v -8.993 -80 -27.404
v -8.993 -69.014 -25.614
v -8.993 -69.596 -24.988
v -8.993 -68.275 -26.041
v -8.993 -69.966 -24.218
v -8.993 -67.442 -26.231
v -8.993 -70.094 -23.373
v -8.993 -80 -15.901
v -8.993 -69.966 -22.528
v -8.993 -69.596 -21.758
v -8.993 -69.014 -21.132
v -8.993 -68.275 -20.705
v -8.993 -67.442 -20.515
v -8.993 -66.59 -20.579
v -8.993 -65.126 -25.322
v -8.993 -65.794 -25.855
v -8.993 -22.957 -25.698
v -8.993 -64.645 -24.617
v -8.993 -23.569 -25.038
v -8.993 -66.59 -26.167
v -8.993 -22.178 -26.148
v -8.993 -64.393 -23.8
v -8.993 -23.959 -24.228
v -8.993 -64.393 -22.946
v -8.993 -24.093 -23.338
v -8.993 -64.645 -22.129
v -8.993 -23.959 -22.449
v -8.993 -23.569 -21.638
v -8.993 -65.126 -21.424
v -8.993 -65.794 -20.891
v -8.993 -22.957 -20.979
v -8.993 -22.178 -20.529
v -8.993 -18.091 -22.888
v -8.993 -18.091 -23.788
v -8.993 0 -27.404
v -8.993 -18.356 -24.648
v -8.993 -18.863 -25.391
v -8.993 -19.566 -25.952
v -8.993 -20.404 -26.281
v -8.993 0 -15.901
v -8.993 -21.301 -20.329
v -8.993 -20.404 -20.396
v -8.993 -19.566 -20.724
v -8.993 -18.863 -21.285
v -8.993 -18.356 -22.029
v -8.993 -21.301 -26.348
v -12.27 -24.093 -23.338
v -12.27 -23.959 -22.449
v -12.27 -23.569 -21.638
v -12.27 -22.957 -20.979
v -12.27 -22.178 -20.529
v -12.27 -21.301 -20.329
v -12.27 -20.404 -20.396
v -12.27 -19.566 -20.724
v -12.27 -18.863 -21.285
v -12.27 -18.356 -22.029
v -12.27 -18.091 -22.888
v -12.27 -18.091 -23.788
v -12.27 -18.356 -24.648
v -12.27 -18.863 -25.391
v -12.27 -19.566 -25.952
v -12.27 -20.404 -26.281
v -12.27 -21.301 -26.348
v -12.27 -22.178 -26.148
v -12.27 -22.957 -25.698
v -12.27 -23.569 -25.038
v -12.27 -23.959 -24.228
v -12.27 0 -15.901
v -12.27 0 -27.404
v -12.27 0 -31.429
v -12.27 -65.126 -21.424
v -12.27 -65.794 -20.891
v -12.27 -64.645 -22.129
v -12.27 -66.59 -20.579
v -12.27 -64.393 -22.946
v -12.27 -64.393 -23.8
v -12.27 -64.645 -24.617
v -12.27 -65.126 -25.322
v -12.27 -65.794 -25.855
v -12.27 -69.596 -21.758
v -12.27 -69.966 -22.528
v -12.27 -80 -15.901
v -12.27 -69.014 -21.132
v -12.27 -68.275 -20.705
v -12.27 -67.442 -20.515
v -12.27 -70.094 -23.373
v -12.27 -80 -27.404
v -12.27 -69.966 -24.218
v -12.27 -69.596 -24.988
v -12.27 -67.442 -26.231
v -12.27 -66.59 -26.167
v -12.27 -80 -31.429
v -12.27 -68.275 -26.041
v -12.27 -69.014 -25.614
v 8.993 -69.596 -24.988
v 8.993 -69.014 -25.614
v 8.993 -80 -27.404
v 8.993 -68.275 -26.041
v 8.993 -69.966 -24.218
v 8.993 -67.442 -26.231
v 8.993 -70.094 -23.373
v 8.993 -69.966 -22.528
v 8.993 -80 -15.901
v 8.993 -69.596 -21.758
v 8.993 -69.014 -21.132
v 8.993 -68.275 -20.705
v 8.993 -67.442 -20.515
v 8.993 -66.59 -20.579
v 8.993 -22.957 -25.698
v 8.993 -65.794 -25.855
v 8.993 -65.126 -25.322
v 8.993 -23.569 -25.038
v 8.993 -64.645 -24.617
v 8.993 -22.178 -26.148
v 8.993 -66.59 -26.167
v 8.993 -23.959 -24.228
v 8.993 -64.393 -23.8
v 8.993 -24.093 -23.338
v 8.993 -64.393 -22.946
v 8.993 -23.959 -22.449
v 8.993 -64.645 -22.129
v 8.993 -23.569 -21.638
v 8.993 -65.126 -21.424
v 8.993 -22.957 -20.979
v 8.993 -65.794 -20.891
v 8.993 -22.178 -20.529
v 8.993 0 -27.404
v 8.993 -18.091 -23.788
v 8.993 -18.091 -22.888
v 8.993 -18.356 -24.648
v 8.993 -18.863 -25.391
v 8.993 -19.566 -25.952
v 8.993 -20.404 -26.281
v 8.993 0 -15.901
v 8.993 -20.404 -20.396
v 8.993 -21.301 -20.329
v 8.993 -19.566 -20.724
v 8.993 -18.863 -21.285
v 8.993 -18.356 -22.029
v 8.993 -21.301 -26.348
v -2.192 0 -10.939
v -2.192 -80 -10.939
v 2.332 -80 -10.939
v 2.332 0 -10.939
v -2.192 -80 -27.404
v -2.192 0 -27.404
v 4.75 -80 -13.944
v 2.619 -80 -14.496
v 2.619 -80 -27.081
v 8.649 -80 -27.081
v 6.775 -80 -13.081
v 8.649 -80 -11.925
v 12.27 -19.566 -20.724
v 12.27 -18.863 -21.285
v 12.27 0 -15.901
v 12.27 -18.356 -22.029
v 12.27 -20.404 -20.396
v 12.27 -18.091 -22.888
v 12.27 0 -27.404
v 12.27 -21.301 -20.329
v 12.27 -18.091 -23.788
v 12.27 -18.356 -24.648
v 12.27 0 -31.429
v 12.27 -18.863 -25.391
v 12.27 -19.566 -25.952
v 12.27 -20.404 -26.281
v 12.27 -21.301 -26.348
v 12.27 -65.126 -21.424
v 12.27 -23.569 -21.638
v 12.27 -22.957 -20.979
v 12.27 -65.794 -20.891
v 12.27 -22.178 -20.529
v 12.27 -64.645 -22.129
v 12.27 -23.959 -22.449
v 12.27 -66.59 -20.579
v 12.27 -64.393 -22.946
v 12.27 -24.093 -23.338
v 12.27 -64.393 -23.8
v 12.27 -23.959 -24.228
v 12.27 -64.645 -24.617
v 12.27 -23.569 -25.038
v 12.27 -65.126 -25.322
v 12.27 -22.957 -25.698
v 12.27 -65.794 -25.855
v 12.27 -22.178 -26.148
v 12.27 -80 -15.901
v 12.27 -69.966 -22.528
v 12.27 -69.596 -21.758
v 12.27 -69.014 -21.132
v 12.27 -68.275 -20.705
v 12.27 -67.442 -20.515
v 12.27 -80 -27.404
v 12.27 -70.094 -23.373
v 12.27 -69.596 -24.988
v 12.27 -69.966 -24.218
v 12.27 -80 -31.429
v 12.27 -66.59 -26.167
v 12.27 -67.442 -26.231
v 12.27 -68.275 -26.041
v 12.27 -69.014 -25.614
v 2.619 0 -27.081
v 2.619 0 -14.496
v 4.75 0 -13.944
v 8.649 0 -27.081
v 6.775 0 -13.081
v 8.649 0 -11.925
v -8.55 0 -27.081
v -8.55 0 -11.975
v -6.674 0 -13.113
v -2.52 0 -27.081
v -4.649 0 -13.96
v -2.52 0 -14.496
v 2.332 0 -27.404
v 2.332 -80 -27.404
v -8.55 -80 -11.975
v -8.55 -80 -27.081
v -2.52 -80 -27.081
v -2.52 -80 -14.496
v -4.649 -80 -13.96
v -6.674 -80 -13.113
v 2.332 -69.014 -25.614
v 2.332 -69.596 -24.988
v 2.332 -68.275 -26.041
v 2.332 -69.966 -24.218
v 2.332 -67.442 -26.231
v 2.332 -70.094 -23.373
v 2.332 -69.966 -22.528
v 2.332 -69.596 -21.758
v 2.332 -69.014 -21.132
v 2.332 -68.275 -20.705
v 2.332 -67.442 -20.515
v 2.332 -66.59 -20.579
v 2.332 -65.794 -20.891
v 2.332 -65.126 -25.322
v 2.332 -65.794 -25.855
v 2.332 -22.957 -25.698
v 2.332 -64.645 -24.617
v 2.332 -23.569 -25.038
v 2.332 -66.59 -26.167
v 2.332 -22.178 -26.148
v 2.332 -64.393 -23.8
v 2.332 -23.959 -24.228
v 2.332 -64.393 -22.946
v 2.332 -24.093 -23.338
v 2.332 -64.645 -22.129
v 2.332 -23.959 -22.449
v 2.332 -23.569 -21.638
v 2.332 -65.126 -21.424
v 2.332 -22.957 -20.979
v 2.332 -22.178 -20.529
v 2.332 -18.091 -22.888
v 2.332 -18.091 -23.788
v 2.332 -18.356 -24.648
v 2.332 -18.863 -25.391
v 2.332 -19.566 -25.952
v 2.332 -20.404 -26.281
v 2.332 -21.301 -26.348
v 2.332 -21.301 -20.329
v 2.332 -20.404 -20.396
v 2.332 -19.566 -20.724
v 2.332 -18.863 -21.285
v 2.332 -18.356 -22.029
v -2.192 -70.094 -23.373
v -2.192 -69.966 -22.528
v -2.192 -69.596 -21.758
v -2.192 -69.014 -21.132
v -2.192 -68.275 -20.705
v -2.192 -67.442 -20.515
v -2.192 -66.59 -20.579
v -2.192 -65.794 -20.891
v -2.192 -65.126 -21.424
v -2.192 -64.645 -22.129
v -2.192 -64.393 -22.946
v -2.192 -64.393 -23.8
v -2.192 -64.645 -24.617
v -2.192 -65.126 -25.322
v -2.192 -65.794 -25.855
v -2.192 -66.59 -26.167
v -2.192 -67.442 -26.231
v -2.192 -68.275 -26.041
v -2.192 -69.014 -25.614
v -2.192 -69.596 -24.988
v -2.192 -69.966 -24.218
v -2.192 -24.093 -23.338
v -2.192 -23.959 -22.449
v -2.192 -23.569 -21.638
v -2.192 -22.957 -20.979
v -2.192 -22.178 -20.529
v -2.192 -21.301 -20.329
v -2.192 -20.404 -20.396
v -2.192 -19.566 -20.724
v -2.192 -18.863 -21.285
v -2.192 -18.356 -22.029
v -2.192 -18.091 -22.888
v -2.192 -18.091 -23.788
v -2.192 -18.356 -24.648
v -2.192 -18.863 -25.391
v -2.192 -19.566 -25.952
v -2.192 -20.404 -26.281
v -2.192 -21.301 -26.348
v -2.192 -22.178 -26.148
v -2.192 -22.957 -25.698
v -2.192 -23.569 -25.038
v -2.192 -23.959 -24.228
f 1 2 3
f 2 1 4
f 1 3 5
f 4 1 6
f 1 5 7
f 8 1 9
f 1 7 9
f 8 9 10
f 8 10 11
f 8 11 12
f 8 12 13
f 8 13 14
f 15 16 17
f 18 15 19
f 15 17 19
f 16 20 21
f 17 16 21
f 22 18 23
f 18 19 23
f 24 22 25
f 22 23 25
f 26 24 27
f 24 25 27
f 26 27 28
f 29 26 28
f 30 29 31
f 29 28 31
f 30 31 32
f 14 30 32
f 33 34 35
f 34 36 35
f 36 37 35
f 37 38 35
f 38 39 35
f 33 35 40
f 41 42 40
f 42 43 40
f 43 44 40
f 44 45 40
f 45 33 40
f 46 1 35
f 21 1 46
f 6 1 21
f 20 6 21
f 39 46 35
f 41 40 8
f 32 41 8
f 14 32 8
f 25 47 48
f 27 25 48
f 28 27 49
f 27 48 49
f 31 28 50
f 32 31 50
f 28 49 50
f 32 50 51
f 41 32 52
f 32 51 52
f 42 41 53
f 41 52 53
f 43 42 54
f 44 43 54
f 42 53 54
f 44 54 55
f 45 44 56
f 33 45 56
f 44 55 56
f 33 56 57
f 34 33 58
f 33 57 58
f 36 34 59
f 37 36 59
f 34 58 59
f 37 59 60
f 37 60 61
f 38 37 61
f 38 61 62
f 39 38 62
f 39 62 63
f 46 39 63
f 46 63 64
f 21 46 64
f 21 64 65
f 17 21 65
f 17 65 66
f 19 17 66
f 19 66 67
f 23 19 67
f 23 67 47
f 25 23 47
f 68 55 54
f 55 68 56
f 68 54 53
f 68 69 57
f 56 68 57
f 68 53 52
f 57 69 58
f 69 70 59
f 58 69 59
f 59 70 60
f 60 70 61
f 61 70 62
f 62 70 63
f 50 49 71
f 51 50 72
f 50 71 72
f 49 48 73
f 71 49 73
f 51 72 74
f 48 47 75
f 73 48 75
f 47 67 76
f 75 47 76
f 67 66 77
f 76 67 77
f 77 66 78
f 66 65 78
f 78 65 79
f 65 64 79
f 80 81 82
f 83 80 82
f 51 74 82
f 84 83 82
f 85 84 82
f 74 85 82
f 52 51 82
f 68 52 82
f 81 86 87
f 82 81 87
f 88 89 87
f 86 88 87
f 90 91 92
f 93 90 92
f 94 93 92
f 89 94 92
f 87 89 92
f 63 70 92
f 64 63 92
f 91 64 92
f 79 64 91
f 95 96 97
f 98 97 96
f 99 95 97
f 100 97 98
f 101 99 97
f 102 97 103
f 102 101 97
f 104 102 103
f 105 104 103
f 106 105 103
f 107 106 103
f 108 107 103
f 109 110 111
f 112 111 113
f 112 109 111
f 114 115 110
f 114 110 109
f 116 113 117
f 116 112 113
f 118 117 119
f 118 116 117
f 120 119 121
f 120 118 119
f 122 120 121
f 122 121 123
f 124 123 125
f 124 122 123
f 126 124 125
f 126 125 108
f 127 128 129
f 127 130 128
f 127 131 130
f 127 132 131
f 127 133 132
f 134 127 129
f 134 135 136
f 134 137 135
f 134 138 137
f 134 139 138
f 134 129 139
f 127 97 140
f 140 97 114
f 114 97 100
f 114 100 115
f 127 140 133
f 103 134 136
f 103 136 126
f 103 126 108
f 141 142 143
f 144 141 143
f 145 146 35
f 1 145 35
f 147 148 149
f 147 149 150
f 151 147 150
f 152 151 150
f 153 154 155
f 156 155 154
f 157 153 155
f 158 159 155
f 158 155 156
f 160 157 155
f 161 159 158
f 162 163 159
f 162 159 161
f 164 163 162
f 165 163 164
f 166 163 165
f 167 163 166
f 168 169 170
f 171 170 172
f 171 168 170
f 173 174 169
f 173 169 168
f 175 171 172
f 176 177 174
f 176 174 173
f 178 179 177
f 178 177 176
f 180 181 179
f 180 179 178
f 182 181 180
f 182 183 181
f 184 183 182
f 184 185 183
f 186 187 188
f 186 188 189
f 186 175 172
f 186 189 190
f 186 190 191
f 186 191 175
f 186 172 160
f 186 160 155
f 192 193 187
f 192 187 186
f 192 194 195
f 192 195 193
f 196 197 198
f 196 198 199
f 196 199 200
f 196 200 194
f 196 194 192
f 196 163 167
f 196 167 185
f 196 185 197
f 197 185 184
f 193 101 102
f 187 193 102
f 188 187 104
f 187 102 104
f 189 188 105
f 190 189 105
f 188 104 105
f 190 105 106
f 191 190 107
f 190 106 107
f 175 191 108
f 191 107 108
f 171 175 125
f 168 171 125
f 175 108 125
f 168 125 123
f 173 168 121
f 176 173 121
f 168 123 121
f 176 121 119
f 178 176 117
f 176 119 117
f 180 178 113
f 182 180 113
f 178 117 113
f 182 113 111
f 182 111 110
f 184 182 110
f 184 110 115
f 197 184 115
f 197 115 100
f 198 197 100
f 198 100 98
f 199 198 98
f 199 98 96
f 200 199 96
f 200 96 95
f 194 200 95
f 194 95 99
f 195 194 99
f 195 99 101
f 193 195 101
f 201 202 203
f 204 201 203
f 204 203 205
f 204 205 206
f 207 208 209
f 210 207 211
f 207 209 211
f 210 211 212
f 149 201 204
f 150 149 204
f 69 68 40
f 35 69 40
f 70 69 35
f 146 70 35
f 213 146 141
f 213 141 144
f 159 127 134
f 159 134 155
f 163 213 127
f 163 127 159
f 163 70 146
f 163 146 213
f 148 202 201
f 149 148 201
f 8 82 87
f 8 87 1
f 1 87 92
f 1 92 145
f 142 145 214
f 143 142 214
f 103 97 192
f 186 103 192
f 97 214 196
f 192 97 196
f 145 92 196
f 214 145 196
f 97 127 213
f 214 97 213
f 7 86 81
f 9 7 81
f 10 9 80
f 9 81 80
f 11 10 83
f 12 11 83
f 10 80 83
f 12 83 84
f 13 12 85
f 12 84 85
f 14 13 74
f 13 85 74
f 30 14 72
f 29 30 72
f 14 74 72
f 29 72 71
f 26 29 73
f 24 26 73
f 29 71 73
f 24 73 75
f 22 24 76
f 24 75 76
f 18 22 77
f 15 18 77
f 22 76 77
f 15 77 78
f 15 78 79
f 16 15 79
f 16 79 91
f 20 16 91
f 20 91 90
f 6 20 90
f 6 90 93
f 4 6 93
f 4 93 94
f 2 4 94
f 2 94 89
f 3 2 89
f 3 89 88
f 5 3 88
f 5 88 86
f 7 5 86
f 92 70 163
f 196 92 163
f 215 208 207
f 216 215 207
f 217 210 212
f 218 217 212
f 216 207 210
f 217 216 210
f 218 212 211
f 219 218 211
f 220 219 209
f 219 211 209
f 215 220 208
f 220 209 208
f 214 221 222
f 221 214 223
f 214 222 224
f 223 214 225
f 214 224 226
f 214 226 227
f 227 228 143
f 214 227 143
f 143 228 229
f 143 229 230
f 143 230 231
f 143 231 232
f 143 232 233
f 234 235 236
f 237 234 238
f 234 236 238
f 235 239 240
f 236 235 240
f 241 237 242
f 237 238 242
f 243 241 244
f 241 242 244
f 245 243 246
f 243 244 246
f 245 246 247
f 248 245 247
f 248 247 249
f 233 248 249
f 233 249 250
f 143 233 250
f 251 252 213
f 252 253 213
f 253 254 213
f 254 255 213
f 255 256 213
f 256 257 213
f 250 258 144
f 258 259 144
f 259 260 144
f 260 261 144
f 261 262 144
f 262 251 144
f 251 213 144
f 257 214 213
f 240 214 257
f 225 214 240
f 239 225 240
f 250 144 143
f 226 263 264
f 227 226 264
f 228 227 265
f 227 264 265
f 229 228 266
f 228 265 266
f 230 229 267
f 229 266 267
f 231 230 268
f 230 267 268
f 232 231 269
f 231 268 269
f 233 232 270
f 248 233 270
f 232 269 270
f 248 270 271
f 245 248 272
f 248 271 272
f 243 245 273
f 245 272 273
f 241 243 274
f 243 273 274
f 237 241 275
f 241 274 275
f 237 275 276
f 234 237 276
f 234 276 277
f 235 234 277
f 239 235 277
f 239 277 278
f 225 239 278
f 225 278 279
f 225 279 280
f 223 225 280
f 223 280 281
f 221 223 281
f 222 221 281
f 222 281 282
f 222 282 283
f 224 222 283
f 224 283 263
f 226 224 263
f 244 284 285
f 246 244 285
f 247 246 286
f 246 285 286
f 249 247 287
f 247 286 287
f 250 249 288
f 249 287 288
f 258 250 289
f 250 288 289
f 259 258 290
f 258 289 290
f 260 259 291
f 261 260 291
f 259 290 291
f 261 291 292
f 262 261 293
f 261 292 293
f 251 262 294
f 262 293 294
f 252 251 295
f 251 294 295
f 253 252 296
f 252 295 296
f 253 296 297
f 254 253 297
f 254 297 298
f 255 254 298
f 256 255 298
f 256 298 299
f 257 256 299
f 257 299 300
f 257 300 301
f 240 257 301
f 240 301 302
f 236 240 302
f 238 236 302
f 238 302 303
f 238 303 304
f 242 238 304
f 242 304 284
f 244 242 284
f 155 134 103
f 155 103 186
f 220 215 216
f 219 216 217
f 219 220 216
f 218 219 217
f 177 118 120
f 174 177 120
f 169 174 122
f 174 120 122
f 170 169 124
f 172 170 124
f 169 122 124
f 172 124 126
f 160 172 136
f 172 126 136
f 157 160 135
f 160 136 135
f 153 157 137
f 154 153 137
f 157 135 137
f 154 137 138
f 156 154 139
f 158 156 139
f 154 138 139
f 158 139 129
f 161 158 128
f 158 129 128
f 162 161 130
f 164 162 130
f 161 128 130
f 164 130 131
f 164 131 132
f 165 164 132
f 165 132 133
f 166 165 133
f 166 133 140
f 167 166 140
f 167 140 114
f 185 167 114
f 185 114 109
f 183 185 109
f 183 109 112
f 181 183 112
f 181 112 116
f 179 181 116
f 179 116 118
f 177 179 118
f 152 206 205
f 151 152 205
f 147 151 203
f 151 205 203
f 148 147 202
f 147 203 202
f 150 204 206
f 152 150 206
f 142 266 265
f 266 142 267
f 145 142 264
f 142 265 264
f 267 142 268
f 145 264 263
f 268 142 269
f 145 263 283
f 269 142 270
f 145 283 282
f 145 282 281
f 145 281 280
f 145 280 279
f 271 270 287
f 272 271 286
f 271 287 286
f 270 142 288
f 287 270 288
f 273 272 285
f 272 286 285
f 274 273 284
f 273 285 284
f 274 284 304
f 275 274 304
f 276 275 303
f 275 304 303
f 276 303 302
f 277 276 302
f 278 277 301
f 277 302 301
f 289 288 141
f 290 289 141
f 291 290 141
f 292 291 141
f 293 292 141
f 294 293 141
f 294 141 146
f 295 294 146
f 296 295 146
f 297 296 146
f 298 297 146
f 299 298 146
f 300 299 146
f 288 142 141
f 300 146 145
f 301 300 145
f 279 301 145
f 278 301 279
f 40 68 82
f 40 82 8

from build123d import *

# Parameters (mm, degrees)
F1_W     = 3.2777013257
F1_H     = 11.5029346198
F1_W_2   = 4.52345144
F1_H_2   = 4.1451063007
F1_H_3   = 16.4643982425
F2_DEPTH = 80
F5_R     = 3.0180179705
F5_R_2   = 2.8661340768
F6_DEPTH = 77
F7_DEPTH = 9
F8_DEPTH = 8


with BuildPart() as f2:
    # F1 (on Front) → F2 (new body)
    with BuildSketch(Plane.XZ):
        with Locations((10.6315002777, -21.6521834955)):
            Rectangle(F1_W, F1_H)
        with Locations((-10.6315002777, -21.6521834955)):
            Rectangle(F1_W, F1_H)
        with Locations((0.0701001845, -29.4762039557)):
            Rectangle(F1_W_2, F1_H_2)
        with Locations((0.0701001845, -19.1714516841)):
            Rectangle(F1_W_2, F1_H_3)
        Polygon((-2.1916255355, -31.5487571061), (-2.1916255355, -27.4036508054), (-8.9926496148, -27.4036508054), (-12.2703509405, -27.4036508054), (-12.2703509405, -39.4294504076), (12.2703509405, -39.4294504076), (12.2703509405, -27.4036508054), (8.9926496148, -27.4036508054), (2.3318259045, -27.4036508054), (2.3318259045, -31.5487571061), align=None)
    extrude(amount=F2_DEPTH)

    # F5 (on face) → F6 (cut)
    with BuildSketch(Plane(origin=(-12.2703509405, 0, 0), x_dir=(0, -1, 0), z_dir=(-1, 0, 0))):
        with Locations((21.0752002895, -23.3381781727)):
            Circle(F5_R)
        with Locations((67.2274827957, -23.3729947358)):
            Circle(F5_R_2)
    extrude(amount=-F6_DEPTH, mode=Mode.SUBTRACT)

    # F7 (add): a face of the model
    f7_faces = [f2.faces().sort_by_distance(p)[0] for p in [
        (0, -40, -39.4294504076),
    ]]
    extrude(f7_faces, amount=-F7_DEPTH)

    # F8 (cut): a face of the model
    f8_faces = [f2.faces().sort_by_distance(p)[0] for p in [
        (0, -40, -39.4294504076),
    ]]
    extrude(f8_faces, amount=-F8_DEPTH, mode=Mode.SUBTRACT)


with BuildPart() as f2b:
    # F0 (on Front) → F2, piece 2 (new body)
    with BuildSketch(Plane.XZ):
        with BuildLine():
            Line((8.6488667876, -27.0813219249), (8.6488667876, -11.9249372814))
            ThreePointArc((8.6488667876, -11.9249372814), (5.7787876042, -13.5503741535), (2.6189955003, -14.4964784842))
            Line((2.6189955003, -14.4964784842), (2.6189955003, -27.0813219249))
            Line((2.6189955003, -27.0813219249), (8.6488667876, -27.0813219249))
        make_face()
    extrude(amount=F2_DEPTH)


with BuildPart() as f2c:
    # F0 (on Front) → F2, piece 3 (new body)
    with BuildSketch(Plane.XZ):
        with BuildLine():
            ThreePointArc((-2.5203907914, -14.4964784842), (-5.6771197832, -13.5746296138), (-8.5502620786, -11.9746931723))
            Line((-8.5502620786, -11.9746931723), (-8.5502620786, -27.0813219249))
            Line((-8.5502620786, -27.0813219249), (-2.5203907914, -27.0813219249))
            Line((-2.5203907914, -27.0813219249), (-2.5203907914, -14.4964784842))
        make_face()
    extrude(amount=F2_DEPTH)


solid = Compound([f2.part, f2b.part, f2c.part])
